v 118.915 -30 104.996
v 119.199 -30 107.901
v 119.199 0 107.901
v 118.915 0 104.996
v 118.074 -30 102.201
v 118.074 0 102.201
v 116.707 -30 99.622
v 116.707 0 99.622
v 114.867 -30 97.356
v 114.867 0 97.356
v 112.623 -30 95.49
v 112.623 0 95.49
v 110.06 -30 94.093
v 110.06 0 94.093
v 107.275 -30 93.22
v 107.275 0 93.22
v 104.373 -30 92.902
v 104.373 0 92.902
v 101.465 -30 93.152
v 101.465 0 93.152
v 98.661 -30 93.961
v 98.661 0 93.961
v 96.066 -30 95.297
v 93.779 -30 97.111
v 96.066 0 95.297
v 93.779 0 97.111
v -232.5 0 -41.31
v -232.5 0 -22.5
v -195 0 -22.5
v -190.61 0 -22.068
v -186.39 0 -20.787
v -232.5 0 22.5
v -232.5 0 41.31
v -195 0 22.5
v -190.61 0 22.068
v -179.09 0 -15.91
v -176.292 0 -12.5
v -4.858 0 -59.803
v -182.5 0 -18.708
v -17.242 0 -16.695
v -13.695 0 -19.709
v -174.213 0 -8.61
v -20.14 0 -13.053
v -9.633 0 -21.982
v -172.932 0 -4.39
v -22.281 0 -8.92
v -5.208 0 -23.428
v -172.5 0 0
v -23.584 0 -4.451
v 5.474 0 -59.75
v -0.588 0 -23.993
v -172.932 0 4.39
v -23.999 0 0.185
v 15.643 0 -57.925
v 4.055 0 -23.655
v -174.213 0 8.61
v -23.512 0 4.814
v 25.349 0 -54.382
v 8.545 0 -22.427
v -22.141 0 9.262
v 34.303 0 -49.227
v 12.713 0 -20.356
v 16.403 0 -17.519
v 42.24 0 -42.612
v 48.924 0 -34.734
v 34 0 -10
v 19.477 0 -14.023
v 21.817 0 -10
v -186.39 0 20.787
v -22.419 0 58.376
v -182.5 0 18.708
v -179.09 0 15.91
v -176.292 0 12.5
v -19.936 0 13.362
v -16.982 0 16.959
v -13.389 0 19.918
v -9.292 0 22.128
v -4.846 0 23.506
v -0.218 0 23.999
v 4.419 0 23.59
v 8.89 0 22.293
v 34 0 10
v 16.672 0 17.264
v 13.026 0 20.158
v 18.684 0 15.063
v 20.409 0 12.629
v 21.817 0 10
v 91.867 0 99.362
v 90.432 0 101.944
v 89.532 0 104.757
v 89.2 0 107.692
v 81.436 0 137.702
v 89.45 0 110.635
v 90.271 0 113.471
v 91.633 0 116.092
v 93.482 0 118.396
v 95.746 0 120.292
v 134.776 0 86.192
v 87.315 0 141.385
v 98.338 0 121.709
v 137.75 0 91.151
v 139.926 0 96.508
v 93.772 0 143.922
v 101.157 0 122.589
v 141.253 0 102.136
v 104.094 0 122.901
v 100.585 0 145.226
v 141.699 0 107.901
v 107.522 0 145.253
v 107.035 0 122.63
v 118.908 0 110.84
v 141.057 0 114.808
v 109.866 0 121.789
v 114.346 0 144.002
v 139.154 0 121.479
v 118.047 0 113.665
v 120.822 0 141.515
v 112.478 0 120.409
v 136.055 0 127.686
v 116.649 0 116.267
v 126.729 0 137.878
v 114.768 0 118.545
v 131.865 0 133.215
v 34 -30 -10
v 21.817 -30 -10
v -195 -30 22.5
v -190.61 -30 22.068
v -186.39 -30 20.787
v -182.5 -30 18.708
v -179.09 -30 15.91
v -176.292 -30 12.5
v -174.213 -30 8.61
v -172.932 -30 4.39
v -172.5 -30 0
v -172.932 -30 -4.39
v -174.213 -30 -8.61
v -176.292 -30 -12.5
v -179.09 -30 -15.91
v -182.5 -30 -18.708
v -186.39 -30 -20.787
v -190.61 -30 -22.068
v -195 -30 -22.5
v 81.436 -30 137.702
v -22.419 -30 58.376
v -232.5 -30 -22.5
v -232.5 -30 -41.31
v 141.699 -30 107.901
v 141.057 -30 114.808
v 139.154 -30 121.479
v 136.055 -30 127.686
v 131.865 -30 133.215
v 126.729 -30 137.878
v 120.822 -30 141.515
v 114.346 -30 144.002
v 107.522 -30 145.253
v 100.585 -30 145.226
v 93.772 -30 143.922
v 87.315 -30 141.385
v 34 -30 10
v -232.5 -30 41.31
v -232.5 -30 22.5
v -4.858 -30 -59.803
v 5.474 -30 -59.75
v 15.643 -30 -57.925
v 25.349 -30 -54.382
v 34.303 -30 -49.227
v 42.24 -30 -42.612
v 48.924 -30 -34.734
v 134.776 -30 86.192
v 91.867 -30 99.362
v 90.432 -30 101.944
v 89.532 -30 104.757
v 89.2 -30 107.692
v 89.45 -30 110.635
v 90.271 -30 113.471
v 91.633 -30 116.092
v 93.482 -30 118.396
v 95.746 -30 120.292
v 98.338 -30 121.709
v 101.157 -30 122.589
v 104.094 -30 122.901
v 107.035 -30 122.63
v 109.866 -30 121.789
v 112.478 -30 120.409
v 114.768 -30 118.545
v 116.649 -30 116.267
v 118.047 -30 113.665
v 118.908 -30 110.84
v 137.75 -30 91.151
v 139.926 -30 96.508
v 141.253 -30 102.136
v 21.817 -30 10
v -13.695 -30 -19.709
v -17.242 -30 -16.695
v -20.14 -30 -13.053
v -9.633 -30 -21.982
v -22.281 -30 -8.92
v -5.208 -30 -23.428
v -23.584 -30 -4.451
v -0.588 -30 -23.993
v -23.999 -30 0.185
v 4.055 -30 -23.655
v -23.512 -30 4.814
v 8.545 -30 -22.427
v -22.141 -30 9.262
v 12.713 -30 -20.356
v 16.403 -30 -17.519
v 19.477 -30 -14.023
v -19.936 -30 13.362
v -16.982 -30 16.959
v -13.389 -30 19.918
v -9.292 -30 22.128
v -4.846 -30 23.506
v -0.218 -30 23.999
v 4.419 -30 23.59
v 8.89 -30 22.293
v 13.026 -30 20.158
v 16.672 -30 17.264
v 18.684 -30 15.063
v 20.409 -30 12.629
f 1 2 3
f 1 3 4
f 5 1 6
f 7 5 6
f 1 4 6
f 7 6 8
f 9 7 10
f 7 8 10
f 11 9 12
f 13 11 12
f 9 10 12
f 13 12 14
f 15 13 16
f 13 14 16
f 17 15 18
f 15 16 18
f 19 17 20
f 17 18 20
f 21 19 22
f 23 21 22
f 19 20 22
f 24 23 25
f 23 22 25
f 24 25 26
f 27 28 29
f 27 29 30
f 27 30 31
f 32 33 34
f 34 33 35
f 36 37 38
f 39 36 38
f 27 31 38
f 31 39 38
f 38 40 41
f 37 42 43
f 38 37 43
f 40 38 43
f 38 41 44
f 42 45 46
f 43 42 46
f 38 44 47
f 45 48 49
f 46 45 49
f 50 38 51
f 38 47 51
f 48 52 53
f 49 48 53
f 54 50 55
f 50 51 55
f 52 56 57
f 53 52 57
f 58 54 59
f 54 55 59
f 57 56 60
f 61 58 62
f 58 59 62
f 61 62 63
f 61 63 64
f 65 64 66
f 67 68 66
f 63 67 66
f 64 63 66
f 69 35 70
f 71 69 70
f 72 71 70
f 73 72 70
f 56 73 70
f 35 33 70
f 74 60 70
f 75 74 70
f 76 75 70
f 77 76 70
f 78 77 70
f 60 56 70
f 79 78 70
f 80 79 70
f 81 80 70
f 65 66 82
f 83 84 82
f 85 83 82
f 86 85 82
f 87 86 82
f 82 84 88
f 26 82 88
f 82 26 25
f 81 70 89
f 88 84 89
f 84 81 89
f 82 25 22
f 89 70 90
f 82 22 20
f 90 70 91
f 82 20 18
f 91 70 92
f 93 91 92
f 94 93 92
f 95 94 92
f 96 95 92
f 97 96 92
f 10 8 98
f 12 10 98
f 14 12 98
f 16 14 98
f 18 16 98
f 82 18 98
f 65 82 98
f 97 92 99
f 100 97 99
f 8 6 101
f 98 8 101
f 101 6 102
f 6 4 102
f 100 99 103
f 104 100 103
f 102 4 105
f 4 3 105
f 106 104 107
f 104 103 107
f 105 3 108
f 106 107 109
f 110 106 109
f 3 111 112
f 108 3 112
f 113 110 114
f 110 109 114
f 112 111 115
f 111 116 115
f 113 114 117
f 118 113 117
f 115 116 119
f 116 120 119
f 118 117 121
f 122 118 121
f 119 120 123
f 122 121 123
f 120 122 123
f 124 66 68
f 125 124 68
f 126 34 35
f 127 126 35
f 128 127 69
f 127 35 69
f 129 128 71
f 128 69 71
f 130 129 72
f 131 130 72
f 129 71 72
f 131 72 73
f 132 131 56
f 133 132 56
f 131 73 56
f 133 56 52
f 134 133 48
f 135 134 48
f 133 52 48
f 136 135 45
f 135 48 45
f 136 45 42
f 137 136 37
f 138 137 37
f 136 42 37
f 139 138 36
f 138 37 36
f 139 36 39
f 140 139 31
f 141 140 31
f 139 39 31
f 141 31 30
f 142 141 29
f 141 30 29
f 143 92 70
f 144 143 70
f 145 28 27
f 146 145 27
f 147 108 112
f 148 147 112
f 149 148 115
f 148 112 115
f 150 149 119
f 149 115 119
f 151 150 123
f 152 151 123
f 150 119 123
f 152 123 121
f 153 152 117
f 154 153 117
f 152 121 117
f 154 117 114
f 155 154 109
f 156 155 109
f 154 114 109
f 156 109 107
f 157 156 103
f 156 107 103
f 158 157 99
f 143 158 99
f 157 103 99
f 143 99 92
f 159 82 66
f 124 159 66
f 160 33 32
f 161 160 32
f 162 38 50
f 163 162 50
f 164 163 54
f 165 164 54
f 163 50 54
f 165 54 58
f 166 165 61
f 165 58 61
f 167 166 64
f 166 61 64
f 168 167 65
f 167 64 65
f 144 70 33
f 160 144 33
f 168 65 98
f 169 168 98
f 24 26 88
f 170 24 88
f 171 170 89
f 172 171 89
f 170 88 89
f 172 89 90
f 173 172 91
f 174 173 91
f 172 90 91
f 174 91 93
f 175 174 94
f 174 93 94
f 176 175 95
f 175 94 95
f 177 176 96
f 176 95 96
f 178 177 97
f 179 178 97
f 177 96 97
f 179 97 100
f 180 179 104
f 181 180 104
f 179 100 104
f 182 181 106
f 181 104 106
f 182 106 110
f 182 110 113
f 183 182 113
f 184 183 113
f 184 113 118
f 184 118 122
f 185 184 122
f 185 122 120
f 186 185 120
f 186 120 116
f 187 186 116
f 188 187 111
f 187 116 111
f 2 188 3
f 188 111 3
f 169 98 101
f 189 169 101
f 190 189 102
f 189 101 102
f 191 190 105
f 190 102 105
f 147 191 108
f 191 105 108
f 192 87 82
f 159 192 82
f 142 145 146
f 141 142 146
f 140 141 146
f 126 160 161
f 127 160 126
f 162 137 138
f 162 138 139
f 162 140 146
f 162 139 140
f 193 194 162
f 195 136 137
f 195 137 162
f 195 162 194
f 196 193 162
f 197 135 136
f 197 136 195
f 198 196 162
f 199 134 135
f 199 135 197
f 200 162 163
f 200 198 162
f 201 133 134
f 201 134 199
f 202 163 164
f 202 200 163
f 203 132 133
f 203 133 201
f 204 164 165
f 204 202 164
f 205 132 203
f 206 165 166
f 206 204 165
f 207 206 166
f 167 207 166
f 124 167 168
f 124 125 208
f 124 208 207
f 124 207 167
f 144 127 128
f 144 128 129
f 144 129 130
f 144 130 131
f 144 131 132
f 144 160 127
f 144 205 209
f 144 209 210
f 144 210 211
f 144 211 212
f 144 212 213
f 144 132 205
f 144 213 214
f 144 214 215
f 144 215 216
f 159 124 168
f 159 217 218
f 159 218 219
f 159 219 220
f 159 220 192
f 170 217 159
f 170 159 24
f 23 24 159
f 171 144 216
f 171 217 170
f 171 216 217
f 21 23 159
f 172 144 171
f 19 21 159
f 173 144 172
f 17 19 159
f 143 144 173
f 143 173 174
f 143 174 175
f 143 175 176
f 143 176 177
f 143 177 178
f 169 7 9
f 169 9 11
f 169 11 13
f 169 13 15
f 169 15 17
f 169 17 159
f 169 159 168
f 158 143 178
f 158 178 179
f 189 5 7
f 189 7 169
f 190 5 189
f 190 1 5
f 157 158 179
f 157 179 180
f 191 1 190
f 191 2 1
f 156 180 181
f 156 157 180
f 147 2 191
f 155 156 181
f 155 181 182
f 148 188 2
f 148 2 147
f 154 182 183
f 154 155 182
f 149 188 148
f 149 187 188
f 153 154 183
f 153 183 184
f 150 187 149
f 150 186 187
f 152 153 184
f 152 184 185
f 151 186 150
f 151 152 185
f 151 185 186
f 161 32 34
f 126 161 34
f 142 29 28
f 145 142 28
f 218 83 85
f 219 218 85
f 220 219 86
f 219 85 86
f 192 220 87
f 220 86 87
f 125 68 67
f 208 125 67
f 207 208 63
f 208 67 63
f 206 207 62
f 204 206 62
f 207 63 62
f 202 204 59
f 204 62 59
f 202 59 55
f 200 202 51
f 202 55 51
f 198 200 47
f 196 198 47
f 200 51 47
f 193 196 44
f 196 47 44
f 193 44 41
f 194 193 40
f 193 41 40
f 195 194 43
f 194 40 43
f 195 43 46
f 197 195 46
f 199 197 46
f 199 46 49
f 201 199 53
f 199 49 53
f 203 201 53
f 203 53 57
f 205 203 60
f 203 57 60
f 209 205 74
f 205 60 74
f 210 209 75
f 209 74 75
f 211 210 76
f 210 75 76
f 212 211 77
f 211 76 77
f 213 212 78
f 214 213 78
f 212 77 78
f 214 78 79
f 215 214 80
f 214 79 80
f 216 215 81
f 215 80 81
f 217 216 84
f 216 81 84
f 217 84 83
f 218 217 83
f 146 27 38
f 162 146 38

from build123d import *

# Parameters (mm, degrees)
F1_DEPTH = 30


with BuildPart() as f1:
    # F0 (on Front) → F1 (new body)
    with BuildSketch(Plane.XZ):
        with BuildLine():
            ThreePointArc((41.6795022275, 43.1603880203), (20.2038503869, 56.496056761), (-4.8582300529, 59.8029898981))
            ThreePointArc((-4.8582300529, 59.8029898981), (-21.5105948147, 56.0115551535), (-36.4201459122, 47.6819984034))
            ThreePointArc((-36.4201459122, 47.6819984034), (-53.7829376045, 26.5969100204), (-60, 0))
            ThreePointArc((-60, 0), (-44.110621188, -40.672510353), (-4.8582300529, -59.8029898981))
            ThreePointArc((-4.8582300529, -59.8029898981), (25.3488261592, -54.382322609), (48.9239965804, -34.7338819973))
            ThreePointArc((48.9239965804, -34.7338819973), (57.1639737721, -18.2285518511), (60, 0))
            ThreePointArc((60, 0), (55.2302912071, 23.4438677094), (41.6795022275, 43.1603880203))
        make_face()
        with BuildLine():
            ThreePointArc((21.8174242293, -10), (-23.5836522276, -4.4509940021), (16.671800891, 17.2641552081))
            ThreePointArc((16.671800891, 17.2641552081), (19.5843585627, 13.8727394442), (21.8174242293, 10))
            Line((21.8174242293, 10), (34, 10))
            Line((34, 10), (34, -10))
            Line((34, -10), (21.8174242293, -10))
        make_face(mode=Mode.SUBTRACT)
        with BuildLine():
            Line((-22.4187933011, 58.3764181454), (-4.8582300529, 59.8029898981))
            ThreePointArc((-4.8582300529, 59.8029898981), (20.2038503869, 56.496056761), (41.6795022275, 43.1603880203))
            Line((41.6795022275, 43.1603880203), (78.1490666766, 80.9257275381))
            ThreePointArc((78.1490666766, 80.9257275381), (66.7614457161, 110.0684180864), (81.4361643738, 137.7022190529))
            Line((81.4361643738, 137.7022190529), (-22.4187933011, 58.3764181454))
        make_face()
        with BuildLine():
            ThreePointArc((-36.4201459122, 47.6819984034), (-21.5105948147, 56.0115551535), (-4.8582300529, 59.8029898981))
            Line((-4.8582300529, 59.8029898981), (-22.4187933011, 58.3764181454))
            Line((-22.4187933011, 58.3764181454), (-36.4201459122, 47.6819984034))
        make_face()
        with BuildLine():
            ThreePointArc((-60, 0), (-53.7829376045, 26.5969100204), (-36.4201459122, 47.6819984034))
            Line((-36.4201459122, 47.6819984034), (-22.4187933011, 58.3764181454))
            Line((-22.4187933011, 58.3764181454), (-232.5, 41.31))
            Line((-232.5, 41.31), (-232.5, 22.5))
            Line((-232.5, 22.5), (-195, 22.5))
            ThreePointArc((-195, 22.5), (-179.0900974233, 15.9099025767), (-172.5, 0))
            Line((-172.5, 0), (-60, 0))
        make_face()
        with BuildLine():
            Line((78.1490666766, 80.9257275381), (41.6795022275, 43.1603880203))
            ThreePointArc((41.6795022275, 43.1603880203), (55.2302912071, 23.4438677094), (60, 0))
            ThreePointArc((60, 0), (57.1639737721, -18.2285518511), (48.9239965804, -34.7338819973))
            Line((48.9239965804, -34.7338819973), (134.7762534316, 86.1922938025))
            ThreePointArc((134.7762534316, 86.1922938025), (107.6714265254, 70.5621088412), (78.1490666766, 80.9257275381))
        make_face()
        with BuildLine():
            ThreePointArc((-4.8582300529, -59.8029898981), (-44.110621188, -40.672510353), (-60, 0))
            Line((-60, 0), (-172.5, 0))
            ThreePointArc((-172.5, 0), (-179.0900974233, -15.9099025767), (-195, -22.5))
            Line((-195, -22.5), (-232.5, -22.5))
            Line((-232.5, -22.5), (-232.5, -41.31))
            Line((-232.5, -41.31), (-4.8582300529, -59.8029898981))
        make_face()
        with BuildLine():
            ThreePointArc((81.4361643738, 137.7022190529), (66.7614457161, 110.0684180864), (78.1490666766, 80.9257275381))
            ThreePointArc((78.1490666766, 80.9257275381), (107.6714265254, 70.5621088412), (134.7762534316, 86.1922938025))
            ThreePointArc((134.7762534316, 86.1922938025), (139.9262391764, 96.5081251439), (141.6987555688, 107.9009700508))
            ThreePointArc((141.6987555688, 107.9009700508), (120.8218243316, 141.5153060536), (81.4361643738, 137.7022190529))
        make_face()
        with BuildLine():
            ThreePointArc((119.1987555688, 107.9009700508), (110.0597224962, 94.093397249), (93.778880012, 97.1108730457))
            ThreePointArc((93.778880012, 97.1108730457), (98.3377886415, 121.7085428526), (119.1987555688, 107.9009700508))
        make_face(mode=Mode.SUBTRACT)
    extrude(amount=F1_DEPTH)


solid = f1.part
